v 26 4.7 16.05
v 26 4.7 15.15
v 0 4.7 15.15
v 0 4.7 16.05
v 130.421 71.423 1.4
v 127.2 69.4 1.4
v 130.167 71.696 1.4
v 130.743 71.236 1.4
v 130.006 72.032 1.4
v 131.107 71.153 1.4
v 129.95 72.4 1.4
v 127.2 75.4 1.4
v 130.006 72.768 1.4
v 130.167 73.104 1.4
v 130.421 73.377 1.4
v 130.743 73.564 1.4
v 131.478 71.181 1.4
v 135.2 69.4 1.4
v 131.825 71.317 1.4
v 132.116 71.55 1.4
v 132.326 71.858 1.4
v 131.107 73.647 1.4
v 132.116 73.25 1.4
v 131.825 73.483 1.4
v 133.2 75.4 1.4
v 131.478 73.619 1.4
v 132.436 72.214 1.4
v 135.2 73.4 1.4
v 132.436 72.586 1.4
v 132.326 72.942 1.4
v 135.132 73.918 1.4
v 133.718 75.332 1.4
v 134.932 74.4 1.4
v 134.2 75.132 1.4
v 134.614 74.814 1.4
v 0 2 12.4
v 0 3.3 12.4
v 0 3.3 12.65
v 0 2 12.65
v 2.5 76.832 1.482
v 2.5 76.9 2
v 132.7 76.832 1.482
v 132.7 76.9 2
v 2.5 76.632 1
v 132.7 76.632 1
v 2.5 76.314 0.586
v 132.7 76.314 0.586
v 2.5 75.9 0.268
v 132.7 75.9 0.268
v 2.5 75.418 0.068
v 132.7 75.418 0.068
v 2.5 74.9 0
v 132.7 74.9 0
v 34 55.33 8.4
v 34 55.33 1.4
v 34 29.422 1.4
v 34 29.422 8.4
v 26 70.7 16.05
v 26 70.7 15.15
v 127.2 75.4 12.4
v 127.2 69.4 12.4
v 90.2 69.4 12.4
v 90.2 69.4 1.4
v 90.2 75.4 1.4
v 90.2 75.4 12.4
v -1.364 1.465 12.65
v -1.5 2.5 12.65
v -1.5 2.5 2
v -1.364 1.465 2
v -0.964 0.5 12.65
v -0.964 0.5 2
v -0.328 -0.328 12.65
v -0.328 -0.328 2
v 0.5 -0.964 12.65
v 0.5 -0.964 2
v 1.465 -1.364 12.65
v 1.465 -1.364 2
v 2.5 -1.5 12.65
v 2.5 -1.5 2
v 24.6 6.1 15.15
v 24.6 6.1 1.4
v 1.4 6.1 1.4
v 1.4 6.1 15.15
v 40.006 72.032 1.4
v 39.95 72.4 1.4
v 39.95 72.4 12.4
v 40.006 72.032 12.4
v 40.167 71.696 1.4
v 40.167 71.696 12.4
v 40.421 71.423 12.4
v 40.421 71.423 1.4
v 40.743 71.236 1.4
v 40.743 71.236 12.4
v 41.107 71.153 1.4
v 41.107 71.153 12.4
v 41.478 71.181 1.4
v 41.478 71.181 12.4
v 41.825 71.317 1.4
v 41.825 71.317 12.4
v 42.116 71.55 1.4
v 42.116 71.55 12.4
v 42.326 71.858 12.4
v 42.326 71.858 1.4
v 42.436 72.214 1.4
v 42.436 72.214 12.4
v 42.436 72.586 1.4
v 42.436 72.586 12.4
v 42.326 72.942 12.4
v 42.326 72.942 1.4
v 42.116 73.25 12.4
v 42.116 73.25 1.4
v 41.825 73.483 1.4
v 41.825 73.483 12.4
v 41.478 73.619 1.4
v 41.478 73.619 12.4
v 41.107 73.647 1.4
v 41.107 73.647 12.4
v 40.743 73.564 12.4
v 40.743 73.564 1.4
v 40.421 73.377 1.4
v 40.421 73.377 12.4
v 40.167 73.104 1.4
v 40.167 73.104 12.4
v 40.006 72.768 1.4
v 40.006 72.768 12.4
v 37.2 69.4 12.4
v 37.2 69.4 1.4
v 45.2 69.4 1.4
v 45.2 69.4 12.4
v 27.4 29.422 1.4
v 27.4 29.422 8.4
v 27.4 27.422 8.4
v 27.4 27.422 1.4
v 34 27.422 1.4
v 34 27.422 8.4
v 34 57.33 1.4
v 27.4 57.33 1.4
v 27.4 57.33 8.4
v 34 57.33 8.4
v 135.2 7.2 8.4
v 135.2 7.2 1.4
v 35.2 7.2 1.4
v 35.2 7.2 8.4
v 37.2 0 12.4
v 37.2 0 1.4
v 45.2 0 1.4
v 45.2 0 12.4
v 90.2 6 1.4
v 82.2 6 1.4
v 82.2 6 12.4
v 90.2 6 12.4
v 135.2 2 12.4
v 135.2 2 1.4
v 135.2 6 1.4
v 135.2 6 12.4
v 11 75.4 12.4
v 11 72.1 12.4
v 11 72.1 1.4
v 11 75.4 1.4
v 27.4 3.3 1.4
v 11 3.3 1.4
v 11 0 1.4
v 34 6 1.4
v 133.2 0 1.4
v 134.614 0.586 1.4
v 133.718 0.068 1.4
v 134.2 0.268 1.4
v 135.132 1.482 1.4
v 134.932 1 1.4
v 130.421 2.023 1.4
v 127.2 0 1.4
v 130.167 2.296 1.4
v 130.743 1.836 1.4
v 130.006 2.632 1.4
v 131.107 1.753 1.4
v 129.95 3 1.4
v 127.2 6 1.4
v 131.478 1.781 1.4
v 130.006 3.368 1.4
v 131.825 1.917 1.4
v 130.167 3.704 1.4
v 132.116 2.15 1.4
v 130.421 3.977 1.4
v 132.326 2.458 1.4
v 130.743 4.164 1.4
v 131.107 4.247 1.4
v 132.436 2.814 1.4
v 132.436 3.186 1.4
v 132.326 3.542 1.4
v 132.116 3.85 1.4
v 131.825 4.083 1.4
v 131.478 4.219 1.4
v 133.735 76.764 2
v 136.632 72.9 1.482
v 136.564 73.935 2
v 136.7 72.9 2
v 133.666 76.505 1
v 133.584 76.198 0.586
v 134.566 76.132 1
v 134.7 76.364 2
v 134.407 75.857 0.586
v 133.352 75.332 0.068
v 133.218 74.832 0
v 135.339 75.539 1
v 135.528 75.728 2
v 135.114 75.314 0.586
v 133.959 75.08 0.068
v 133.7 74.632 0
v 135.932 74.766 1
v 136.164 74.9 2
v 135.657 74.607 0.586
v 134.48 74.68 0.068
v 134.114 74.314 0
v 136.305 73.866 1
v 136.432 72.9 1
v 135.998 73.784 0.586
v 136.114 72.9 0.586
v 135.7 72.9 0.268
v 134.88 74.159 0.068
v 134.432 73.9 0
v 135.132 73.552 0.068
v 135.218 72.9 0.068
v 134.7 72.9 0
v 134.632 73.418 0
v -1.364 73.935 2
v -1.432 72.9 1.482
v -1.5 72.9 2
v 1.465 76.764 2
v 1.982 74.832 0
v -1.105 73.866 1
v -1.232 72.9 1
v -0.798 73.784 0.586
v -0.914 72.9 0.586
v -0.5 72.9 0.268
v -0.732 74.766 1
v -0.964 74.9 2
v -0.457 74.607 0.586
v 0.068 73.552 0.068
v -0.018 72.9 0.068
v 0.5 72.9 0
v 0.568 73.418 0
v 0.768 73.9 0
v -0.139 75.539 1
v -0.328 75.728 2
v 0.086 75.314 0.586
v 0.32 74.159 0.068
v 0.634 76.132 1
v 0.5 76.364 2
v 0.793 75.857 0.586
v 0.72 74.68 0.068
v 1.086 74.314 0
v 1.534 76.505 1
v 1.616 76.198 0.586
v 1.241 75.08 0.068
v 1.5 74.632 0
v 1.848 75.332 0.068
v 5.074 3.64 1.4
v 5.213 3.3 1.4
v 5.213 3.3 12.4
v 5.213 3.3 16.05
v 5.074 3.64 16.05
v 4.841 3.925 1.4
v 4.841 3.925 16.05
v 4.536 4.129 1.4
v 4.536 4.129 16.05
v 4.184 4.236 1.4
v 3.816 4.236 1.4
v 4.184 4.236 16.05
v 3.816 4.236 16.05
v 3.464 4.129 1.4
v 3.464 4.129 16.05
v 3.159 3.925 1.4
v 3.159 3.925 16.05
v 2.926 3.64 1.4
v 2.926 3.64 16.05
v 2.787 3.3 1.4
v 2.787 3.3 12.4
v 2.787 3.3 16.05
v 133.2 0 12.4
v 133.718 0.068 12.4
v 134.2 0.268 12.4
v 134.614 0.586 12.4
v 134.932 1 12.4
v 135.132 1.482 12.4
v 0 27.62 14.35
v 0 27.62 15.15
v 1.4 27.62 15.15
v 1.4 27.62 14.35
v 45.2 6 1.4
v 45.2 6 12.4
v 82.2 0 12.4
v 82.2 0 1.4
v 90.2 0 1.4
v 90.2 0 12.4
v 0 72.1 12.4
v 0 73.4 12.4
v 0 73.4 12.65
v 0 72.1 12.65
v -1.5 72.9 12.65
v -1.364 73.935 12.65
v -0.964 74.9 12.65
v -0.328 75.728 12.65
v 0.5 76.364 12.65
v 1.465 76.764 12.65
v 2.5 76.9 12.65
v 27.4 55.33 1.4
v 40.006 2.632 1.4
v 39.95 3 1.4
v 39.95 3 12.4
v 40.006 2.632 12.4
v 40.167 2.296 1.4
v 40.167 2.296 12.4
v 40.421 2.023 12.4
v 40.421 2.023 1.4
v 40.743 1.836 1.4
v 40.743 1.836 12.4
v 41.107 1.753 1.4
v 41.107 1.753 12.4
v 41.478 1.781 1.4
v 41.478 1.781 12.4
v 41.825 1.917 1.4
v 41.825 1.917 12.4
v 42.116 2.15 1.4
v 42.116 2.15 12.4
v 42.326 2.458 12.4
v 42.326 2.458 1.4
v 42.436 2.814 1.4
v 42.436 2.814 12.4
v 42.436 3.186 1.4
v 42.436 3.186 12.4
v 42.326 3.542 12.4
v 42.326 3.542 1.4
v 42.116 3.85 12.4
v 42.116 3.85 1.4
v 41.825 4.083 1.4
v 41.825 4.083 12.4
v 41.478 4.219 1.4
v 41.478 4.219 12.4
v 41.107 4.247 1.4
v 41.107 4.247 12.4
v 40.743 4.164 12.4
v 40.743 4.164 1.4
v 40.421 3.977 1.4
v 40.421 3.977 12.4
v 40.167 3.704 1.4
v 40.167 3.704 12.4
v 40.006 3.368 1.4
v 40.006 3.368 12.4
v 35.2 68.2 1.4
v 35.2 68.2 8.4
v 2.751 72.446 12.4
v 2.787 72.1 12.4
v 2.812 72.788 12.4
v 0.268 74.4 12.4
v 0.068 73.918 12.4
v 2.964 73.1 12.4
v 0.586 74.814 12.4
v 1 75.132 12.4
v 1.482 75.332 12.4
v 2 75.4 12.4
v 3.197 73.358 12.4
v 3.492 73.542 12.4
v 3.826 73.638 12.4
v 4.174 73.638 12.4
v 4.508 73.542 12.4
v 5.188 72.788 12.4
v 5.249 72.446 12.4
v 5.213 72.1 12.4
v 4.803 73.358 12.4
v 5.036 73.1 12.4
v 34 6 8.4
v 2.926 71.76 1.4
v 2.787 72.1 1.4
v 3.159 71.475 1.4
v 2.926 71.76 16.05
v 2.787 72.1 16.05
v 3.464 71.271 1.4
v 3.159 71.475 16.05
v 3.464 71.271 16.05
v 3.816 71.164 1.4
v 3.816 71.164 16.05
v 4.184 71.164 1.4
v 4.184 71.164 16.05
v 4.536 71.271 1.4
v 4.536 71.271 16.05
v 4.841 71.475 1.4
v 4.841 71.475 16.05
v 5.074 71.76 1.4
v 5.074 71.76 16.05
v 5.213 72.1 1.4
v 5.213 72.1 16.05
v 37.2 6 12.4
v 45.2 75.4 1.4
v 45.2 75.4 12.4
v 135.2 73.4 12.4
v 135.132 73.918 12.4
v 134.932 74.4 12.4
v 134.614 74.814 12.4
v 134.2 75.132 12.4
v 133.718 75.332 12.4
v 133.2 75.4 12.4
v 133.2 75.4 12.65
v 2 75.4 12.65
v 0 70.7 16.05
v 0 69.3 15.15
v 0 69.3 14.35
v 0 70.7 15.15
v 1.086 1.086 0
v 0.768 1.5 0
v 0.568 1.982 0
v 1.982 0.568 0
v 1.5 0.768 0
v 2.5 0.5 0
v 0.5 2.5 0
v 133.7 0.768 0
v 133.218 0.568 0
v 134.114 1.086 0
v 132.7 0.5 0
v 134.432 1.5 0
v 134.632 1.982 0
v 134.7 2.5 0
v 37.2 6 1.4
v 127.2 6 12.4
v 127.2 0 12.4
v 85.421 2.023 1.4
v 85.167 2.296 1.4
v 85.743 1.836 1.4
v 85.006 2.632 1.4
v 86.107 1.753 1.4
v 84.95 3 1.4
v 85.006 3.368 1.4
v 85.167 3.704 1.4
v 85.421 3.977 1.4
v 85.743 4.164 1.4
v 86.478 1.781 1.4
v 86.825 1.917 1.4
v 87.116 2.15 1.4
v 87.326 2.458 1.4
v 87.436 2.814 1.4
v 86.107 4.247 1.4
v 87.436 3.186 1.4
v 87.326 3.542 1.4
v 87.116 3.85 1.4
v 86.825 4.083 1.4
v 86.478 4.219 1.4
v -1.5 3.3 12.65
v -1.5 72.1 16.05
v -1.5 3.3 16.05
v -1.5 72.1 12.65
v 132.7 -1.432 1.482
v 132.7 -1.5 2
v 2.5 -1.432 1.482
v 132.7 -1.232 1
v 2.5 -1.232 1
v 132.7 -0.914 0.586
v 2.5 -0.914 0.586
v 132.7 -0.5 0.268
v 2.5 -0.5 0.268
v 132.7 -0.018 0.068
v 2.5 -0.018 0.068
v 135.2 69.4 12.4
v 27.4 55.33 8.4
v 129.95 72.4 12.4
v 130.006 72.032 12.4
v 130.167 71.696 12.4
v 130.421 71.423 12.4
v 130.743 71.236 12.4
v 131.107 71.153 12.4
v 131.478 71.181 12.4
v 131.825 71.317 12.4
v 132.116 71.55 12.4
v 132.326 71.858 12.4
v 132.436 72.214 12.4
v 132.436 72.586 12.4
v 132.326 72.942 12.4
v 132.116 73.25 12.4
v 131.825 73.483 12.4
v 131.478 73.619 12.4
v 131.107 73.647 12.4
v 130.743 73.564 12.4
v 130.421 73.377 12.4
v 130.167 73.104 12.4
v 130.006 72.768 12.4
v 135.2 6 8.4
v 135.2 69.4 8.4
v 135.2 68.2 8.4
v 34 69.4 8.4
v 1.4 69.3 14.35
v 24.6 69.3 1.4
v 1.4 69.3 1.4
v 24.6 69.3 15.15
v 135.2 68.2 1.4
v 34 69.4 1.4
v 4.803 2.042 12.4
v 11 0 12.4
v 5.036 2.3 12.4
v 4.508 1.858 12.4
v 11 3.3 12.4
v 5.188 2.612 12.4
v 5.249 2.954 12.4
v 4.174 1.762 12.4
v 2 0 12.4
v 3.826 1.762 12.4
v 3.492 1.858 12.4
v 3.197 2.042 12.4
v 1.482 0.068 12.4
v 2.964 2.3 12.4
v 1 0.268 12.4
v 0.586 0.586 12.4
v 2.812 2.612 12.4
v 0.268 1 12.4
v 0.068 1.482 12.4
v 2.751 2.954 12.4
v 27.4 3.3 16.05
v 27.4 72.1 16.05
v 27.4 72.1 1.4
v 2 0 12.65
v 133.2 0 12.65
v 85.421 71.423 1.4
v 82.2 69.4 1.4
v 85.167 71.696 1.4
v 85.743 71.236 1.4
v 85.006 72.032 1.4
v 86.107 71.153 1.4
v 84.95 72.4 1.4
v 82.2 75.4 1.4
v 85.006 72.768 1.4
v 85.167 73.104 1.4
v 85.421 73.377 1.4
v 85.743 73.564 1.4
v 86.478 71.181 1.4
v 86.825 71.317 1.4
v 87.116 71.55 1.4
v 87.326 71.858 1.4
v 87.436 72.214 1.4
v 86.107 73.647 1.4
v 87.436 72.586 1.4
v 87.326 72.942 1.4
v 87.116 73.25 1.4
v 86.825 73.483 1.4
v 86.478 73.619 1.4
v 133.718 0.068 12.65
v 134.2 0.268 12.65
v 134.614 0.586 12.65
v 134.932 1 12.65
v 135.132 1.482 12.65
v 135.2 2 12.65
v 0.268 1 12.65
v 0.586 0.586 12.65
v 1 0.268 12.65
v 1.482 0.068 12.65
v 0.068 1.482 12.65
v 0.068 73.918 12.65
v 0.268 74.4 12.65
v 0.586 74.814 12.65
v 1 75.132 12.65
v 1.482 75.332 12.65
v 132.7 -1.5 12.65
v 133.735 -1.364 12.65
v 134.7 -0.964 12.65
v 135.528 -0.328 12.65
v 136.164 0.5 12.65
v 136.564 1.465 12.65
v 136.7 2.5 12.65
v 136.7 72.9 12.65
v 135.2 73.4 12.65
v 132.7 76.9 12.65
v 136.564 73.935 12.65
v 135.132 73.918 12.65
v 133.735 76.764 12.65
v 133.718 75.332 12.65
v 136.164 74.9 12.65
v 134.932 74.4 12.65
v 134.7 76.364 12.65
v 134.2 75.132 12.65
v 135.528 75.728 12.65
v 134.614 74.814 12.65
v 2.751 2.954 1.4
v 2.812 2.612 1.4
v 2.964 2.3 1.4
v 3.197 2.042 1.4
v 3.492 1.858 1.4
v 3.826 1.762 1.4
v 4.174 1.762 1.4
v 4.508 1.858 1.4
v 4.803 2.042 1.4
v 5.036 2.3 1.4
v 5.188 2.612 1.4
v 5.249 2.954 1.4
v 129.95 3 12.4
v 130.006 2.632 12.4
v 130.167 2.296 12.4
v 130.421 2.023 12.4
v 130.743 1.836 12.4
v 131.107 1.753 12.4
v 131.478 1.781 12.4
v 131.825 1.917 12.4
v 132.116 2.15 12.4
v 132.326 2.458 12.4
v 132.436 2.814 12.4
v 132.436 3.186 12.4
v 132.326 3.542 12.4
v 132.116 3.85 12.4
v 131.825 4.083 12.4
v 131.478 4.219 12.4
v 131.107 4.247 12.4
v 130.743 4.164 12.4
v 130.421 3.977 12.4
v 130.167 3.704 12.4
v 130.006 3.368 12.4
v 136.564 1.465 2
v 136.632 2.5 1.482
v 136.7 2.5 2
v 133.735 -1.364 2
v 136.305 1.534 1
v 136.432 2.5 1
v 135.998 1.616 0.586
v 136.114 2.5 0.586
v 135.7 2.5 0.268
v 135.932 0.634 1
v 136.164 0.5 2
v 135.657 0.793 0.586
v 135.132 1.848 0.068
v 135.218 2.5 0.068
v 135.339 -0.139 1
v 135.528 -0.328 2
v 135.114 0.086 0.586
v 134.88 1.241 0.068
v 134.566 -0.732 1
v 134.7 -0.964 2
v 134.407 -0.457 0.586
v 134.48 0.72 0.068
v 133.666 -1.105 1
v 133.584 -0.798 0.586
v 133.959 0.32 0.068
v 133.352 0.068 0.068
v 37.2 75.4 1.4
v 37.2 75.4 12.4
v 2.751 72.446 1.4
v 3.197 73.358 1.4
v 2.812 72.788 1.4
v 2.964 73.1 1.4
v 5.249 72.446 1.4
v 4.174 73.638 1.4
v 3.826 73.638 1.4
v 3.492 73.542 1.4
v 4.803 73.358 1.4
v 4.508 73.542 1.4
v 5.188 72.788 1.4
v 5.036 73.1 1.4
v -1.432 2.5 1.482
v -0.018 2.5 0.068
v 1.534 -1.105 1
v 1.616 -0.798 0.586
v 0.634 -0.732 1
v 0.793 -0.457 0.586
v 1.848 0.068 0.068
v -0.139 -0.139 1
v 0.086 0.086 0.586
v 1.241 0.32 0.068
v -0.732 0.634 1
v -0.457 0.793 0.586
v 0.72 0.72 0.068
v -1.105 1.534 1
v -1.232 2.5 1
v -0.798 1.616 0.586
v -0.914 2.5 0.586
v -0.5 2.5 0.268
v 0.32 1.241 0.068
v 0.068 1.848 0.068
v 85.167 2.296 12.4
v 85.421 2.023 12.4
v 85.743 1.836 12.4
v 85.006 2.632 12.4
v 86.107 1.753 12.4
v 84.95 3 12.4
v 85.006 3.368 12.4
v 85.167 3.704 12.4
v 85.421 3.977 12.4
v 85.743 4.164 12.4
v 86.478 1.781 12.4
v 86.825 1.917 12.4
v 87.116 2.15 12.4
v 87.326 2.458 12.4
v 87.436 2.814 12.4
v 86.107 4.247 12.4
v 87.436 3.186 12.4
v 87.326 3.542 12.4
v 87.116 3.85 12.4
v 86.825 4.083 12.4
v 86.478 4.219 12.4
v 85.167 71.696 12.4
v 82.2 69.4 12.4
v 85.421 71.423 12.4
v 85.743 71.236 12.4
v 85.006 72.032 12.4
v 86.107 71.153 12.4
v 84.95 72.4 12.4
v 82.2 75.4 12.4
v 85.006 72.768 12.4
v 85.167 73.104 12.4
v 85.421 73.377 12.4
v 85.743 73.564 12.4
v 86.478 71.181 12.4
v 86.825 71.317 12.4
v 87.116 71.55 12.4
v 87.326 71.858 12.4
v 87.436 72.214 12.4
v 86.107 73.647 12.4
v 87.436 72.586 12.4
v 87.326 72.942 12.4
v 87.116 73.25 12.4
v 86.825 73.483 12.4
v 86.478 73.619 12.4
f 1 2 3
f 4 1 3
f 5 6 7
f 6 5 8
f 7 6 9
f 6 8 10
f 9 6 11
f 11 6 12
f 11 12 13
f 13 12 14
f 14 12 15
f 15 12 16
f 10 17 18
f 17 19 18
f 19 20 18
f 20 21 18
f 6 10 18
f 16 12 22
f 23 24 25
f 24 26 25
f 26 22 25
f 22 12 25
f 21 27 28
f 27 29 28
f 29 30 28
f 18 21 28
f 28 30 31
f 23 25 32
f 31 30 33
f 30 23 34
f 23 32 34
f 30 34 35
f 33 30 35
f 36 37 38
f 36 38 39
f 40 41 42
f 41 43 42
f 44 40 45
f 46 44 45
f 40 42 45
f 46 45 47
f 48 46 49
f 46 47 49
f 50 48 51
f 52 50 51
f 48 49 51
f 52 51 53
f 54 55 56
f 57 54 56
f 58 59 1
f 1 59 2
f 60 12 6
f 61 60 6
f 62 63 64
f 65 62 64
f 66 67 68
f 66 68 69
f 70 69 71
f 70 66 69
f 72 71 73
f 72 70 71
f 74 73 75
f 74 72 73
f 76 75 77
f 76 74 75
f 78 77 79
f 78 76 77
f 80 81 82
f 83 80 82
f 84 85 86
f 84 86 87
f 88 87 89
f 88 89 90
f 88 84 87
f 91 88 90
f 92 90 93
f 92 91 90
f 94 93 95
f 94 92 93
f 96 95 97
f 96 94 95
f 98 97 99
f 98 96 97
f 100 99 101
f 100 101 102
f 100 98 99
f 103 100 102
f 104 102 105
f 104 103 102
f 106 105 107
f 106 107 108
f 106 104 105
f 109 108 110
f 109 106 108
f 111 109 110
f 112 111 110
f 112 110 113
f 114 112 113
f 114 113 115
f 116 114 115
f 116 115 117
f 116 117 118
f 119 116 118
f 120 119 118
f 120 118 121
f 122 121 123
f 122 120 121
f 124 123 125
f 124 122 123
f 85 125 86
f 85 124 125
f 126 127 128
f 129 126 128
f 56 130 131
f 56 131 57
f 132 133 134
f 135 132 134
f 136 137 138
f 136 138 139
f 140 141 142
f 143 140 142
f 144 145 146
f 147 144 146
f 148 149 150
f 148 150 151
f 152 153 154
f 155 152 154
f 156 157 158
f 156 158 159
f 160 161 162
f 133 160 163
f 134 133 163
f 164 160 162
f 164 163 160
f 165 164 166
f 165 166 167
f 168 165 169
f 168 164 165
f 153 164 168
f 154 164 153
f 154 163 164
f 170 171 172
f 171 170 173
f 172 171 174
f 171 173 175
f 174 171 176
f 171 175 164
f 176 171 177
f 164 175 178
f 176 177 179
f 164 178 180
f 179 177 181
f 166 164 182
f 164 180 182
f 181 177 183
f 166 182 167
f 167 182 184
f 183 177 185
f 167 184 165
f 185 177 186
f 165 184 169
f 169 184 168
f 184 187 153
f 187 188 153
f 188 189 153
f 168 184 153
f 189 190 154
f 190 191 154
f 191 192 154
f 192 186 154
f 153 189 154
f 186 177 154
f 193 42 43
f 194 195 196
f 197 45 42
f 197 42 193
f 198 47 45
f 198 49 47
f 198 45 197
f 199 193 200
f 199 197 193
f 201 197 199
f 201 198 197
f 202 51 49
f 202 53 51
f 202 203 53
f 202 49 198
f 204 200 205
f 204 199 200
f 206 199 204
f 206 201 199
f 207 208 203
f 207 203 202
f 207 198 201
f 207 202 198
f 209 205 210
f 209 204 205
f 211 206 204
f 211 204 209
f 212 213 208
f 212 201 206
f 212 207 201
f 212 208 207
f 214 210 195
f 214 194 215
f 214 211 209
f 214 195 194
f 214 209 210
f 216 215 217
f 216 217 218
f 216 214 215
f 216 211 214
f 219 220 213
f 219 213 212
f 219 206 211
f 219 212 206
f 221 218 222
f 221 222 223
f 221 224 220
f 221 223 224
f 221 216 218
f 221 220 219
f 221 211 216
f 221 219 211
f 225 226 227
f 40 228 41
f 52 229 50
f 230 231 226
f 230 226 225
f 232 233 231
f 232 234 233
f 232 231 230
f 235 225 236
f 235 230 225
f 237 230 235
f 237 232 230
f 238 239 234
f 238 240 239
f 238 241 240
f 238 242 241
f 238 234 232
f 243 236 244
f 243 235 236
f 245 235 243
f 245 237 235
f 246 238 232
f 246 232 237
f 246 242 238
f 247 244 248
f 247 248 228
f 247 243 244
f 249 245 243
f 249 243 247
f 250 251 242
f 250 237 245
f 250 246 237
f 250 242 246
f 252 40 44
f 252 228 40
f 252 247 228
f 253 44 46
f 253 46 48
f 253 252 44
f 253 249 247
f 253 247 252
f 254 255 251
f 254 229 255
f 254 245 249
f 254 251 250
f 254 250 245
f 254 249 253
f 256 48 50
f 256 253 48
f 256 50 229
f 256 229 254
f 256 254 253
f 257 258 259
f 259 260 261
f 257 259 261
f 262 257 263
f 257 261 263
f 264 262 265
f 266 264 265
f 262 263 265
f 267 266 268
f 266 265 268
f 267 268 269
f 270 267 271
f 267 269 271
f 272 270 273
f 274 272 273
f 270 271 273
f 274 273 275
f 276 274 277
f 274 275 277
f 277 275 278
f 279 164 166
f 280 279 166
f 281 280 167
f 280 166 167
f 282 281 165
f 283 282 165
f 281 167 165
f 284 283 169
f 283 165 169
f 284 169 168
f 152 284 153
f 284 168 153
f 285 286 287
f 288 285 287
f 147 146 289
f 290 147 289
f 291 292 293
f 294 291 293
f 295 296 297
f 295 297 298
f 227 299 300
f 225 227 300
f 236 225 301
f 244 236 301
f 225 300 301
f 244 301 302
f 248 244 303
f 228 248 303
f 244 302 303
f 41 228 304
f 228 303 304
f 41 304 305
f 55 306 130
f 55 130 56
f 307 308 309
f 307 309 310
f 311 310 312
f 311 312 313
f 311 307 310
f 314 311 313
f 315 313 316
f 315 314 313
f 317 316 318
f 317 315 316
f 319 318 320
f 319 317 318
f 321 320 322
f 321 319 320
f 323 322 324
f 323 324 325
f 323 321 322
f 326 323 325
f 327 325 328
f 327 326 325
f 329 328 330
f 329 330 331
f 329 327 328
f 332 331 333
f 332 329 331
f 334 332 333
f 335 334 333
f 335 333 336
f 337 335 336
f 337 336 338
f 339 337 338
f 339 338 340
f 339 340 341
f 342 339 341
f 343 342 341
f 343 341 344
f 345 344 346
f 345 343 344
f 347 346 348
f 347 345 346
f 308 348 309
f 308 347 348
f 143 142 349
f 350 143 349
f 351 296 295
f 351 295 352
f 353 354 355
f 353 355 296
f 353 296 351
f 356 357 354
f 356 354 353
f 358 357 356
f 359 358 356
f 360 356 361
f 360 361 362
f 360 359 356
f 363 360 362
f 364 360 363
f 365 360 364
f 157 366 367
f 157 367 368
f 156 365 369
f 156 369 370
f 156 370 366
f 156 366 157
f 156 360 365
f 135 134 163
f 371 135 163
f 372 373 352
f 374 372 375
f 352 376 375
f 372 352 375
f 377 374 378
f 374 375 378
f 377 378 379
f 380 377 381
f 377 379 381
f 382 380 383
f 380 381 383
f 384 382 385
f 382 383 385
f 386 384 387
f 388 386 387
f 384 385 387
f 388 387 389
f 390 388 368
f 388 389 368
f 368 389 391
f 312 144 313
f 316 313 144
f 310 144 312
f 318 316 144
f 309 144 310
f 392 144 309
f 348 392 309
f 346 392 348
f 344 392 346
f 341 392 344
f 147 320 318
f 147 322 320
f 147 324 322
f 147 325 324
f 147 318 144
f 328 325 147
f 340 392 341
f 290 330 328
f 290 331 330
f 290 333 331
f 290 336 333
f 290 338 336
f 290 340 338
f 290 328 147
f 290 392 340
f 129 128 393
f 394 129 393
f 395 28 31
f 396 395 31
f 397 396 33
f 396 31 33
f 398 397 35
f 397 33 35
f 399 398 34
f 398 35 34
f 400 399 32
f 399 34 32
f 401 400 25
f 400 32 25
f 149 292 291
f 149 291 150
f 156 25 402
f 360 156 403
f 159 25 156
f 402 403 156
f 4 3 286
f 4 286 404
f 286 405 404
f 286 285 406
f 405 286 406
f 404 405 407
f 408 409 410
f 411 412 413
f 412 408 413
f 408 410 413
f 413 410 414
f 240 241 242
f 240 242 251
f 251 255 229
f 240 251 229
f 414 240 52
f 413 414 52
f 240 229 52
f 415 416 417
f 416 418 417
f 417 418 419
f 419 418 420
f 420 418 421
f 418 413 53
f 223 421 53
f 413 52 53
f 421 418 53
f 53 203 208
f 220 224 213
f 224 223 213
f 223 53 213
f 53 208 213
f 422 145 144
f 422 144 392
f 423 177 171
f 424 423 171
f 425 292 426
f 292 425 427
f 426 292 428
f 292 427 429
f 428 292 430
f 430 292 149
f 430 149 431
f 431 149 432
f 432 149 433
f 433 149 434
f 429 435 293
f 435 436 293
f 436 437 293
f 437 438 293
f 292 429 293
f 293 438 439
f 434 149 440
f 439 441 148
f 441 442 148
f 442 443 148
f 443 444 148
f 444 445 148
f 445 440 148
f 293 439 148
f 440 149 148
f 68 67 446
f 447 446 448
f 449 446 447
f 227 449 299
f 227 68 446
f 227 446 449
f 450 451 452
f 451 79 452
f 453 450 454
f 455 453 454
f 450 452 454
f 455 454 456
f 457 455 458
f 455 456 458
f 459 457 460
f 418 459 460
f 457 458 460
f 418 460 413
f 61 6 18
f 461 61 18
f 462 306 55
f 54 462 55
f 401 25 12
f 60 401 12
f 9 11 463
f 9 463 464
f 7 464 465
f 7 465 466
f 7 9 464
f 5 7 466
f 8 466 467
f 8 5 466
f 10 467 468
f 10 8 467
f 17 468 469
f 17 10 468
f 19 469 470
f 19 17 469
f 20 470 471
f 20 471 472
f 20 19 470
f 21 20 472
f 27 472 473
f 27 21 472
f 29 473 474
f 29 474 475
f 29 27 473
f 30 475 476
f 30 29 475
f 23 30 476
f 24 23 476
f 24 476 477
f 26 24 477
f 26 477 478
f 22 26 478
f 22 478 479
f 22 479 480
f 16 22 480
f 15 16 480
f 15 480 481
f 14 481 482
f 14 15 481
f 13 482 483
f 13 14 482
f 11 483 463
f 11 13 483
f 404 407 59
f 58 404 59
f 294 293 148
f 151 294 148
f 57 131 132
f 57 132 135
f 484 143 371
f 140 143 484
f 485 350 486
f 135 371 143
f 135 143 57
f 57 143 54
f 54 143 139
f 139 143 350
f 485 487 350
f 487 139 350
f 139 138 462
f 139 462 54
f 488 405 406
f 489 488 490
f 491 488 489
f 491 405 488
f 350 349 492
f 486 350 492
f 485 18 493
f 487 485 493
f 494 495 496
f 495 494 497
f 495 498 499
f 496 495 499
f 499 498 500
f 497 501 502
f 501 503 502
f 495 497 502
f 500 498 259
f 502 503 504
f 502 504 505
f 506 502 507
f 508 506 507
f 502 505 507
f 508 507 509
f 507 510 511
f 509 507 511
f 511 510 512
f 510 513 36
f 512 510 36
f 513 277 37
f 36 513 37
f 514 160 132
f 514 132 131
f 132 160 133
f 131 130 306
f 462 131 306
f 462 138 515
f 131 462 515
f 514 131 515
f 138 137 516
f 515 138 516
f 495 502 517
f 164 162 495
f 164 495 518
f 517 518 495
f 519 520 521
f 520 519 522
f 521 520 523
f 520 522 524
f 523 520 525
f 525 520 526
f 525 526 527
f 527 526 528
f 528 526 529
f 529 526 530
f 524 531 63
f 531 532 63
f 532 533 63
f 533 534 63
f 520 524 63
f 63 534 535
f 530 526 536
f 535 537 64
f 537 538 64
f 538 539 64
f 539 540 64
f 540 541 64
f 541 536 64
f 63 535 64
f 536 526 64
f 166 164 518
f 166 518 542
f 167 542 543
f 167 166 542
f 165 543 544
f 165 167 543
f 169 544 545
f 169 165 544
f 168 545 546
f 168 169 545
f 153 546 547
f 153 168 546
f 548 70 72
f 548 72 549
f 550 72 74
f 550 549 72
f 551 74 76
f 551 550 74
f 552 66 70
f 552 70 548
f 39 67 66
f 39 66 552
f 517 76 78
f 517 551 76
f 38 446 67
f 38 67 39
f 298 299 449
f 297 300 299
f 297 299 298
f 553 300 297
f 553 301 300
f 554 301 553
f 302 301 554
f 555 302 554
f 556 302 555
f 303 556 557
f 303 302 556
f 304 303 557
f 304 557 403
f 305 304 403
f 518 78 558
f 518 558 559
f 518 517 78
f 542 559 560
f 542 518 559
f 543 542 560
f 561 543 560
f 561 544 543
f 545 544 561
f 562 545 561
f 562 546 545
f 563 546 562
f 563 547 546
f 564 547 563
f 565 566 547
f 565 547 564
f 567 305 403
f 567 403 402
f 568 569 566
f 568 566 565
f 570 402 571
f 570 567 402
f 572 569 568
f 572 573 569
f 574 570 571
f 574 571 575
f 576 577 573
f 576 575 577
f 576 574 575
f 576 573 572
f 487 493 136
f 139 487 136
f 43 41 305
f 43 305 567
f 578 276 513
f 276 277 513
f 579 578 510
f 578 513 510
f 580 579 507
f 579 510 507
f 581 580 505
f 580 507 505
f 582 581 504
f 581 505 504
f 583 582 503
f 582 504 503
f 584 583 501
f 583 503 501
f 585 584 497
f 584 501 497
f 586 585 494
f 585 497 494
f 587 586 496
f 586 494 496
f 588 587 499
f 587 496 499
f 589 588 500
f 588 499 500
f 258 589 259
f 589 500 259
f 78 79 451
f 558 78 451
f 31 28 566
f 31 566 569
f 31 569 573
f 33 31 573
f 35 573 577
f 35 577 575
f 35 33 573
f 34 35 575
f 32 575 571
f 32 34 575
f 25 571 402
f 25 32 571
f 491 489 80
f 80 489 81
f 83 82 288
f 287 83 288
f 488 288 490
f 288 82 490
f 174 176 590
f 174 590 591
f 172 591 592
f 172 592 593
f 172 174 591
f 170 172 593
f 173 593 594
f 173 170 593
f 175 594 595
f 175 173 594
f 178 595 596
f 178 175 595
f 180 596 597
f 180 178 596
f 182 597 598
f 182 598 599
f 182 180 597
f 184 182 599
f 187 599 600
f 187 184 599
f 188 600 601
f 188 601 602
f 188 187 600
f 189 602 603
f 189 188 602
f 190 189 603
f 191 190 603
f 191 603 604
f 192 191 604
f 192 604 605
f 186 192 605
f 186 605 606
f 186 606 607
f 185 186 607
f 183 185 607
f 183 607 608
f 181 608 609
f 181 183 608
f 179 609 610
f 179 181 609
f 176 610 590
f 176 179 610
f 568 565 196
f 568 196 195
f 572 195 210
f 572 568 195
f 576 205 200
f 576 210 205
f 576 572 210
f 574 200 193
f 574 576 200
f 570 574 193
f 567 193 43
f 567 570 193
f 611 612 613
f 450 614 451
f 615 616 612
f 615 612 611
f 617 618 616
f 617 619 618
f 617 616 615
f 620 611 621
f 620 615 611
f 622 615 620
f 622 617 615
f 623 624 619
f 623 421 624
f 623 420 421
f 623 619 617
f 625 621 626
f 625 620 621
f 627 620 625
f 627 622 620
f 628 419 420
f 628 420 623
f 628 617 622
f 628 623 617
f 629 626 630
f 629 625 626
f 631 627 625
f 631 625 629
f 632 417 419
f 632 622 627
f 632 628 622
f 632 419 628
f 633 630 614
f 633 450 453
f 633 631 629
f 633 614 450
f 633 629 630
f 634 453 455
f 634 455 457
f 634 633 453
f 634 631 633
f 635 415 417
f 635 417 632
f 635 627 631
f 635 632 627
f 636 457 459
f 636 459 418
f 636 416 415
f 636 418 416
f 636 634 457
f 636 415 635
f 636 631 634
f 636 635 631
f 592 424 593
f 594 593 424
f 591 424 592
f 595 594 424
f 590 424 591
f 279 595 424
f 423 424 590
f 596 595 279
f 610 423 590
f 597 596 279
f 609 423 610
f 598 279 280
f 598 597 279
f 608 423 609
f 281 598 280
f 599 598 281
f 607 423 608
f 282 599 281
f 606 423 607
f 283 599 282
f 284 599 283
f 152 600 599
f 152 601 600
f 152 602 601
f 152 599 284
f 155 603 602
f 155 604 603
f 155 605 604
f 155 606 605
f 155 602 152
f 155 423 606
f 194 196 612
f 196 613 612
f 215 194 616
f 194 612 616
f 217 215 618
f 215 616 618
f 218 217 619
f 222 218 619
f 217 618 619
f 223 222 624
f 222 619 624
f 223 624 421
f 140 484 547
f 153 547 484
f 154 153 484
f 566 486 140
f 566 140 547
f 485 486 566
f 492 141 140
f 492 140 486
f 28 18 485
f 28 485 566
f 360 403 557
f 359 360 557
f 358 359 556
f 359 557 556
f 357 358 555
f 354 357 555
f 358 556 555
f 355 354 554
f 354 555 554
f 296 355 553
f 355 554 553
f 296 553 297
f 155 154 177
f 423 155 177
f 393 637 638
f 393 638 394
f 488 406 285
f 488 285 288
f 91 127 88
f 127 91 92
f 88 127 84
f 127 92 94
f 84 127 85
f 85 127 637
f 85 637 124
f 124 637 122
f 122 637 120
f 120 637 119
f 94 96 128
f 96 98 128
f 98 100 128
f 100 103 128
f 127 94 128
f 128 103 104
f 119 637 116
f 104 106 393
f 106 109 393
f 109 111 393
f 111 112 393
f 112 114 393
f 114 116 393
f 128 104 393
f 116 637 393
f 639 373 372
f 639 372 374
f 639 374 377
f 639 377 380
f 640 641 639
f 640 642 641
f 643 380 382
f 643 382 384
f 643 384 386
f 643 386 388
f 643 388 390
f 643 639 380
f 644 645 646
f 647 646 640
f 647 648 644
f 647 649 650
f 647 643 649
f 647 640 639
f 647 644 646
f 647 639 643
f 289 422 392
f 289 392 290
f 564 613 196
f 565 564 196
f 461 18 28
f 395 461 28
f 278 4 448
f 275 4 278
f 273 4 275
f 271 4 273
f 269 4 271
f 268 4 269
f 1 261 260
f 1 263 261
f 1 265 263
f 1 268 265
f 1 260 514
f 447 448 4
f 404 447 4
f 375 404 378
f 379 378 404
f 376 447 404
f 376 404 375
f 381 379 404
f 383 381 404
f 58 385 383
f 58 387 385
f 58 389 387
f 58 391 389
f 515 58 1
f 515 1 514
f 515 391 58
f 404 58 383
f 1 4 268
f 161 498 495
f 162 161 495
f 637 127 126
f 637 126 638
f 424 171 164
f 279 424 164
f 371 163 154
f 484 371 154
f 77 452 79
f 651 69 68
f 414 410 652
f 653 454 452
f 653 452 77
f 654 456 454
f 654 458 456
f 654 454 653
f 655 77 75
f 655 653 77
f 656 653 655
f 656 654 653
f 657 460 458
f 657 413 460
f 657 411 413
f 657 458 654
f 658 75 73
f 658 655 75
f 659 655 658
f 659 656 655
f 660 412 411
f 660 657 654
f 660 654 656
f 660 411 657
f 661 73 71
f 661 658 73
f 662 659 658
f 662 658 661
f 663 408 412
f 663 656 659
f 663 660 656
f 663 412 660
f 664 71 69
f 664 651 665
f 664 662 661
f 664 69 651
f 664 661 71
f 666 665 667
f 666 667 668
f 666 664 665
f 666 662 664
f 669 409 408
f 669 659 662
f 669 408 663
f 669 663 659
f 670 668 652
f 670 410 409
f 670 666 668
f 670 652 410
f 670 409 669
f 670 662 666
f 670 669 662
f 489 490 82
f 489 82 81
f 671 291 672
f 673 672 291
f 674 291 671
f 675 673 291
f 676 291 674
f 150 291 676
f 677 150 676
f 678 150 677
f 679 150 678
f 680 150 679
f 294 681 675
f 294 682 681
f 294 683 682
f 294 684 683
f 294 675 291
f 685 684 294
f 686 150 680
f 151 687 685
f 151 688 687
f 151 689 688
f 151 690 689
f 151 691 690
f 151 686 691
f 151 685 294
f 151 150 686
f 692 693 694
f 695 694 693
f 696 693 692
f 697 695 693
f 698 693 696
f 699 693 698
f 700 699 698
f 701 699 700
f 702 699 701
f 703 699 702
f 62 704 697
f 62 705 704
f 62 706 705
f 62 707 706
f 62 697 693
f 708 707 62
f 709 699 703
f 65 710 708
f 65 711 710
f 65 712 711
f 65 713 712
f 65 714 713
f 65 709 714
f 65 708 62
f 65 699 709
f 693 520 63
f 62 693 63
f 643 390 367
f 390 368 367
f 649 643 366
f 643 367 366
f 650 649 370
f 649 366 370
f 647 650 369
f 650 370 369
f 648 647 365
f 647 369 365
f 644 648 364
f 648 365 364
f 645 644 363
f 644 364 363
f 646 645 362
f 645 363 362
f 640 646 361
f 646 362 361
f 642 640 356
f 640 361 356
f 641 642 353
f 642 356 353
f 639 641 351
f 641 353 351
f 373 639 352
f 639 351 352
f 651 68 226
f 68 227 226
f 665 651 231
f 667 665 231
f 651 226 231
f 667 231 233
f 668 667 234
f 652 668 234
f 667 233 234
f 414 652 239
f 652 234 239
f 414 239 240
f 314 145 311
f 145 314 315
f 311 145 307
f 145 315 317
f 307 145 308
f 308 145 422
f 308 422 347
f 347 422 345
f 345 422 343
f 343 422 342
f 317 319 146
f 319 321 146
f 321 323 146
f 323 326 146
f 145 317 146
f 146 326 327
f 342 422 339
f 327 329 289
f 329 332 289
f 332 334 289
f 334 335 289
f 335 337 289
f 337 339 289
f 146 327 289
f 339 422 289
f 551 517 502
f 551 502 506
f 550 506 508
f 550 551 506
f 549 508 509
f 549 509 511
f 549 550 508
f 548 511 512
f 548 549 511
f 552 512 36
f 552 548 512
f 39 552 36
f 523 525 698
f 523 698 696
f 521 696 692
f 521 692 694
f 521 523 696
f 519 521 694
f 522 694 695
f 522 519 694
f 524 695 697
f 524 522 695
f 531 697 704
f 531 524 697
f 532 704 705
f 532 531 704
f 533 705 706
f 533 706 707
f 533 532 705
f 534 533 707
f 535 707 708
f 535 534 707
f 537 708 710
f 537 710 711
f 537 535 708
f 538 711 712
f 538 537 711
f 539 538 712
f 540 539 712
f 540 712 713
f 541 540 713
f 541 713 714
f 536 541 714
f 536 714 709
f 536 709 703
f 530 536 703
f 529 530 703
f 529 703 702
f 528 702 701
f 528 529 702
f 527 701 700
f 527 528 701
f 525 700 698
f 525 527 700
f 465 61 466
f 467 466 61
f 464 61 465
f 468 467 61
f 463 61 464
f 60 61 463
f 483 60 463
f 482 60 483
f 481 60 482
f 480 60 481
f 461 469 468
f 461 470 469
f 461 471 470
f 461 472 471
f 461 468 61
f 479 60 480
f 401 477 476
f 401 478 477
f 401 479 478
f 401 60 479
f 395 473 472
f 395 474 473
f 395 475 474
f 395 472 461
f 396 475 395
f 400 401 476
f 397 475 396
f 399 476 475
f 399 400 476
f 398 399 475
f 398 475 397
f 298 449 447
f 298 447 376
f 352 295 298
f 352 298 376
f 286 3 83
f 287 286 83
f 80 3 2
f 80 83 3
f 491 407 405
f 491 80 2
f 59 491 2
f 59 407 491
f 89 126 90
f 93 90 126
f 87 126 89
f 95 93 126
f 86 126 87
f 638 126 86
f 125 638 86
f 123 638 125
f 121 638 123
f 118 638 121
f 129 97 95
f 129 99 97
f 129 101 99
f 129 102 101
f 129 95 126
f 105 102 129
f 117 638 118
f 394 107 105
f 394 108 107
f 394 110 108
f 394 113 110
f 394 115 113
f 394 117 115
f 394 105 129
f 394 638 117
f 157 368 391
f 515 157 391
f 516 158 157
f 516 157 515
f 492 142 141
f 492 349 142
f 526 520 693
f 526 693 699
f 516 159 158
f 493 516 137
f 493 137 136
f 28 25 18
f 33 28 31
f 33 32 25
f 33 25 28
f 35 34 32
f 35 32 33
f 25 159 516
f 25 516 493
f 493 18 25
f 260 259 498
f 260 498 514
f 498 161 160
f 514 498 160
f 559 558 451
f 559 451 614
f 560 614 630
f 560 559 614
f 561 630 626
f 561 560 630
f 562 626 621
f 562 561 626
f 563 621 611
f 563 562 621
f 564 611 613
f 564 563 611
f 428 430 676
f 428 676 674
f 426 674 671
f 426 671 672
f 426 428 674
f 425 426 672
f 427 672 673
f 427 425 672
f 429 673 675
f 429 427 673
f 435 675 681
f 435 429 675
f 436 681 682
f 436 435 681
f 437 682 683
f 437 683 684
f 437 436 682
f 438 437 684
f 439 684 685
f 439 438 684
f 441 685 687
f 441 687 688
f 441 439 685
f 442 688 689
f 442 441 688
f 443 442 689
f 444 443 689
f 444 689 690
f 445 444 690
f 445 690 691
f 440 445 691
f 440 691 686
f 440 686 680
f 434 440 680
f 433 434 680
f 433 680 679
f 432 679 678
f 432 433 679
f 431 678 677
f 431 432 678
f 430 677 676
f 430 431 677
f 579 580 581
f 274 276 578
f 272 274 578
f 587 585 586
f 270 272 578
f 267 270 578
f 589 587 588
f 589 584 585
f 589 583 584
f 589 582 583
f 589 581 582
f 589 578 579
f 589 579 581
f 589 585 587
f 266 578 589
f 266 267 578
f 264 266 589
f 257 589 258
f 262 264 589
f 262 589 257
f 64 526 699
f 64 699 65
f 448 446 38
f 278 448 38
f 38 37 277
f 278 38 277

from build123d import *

# Parameters (mm, degrees)
ESQUISSE1_W             = 138.2
ESQUISSE1_H             = 78.4
BOSS_EXTRU_1_DEPTH      = 12.65
BOSS_EXTRU_2_DEPTH      = 1.4
BOSS_EXTRU_5_START      = 1.4
ESQUISSE1_5_R           = 1.25
BOSS_EXTRU_5_DEPTH      = 11
ESQUISSE1_5_W           = 8
ESQUISSE1_5_H           = 6
BOSS_EXTRU_5_2_DEPTH    = 11
BOSS_EXTRU_5_3_DEPTH    = 11
BOSS_EXTRU_5_4_DEPTH    = 11
BOSS_EXTRU_5_5_DEPTH    = 11
BOSS_EXTRU_5_6_DEPTH    = 11
BOSS_EXTRU_7_START      = 1.4
BOSS_EXTRU_7_DEPTH      = 7
CONG_1_R                = 4
CONG_4_R                = 2
BOSS_EXTRU_8_START      = 1.4
BOSS_EXTRU_8_DEPTH      = 13.75
BOSS_EXTRU_9_START      = 1.4
BOSS_EXTRU_9_DEPTH      = 14.65
BOSS_EXTRU_11_START     = 11
ESQUISSE4_R             = 1.25
BOSS_EXTRU_11_DEPTH     = 11
ESQUISSE5_W             = 6.6
ESQUISSE5_H             = 2
BOSS_EXTRU_12_DEPTH     = 7
CONG_3_R                = 2
ESQUISSE7_W             = 1.4
ESQUISSE7_H             = 41.680372202
ENL_V_MAT_EXTRU_3_DEPTH = 0.8
ESQUISSE2_W             = 1.5
ESQUISSE2_H             = 68.8
BOSS_EXTRU_14_DEPTH     = 3.4
ENL_V_START             = 30.15
ENL_V_MAT_EXTRU_4_DEPTH = 30.15


with BuildPart() as part:
    # Esquisse1 → Boss.-Extru.1 (new body)
    with BuildSketch(Plane.XY):
        with Locations((67.6, 37.7)):
            Rectangle(ESQUISSE1_W, ESQUISSE1_H)
        with BuildLine():
            Line((0, 0), (133.2, 0))
            ThreePointArc((133.2, 0), (134.614213562, 0.585786438), (135.2, 2))
            Line((135.2, 2), (135.2, 73.4))
            ThreePointArc((135.2, 73.4), (134.614213562, 74.814213562), (133.2, 75.4))
            Line((133.2, 75.4), (0, 75.4))
            Line((0, 75.4), (0, 0))
        make_face(mode=Mode.SUBTRACT)
    extrude(amount=BOSS_EXTRU_1_DEPTH)

    # Esquisse1<4> → Boss.-Extru.2 (add)
    with BuildSketch(Plane.XY):
        with BuildLine():
            Line((0, 0), (133.2, 0))
            ThreePointArc((133.2, 0), (134.614213562, 0.585786438), (135.2, 2))
            Line((135.2, 2), (135.2, 73.4))
            ThreePointArc((135.2, 73.4), (134.614213562, 74.814213562), (133.2, 75.4))
            Line((133.2, 75.4), (0, 75.4))
            Line((0, 75.4), (0, 0))
        make_face()
    extrude(amount=BOSS_EXTRU_2_DEPTH)

    # Esquisse1<6> → Boss.-Extru.7 (add)
    with BuildSketch(Plane.XY.offset(BOSS_EXTRU_7_START)):
        Polygon((135.2, 68.2), (135.2, 69.4), (127.2, 69.4), (90.2, 69.4), (82.2, 69.4), (45.2, 69.4), (37.2, 69.4), (34, 69.4), (34, 37.7), (35.2, 37.7), (35.2, 68.2), align=None)
        Polygon((135.2, 6), (135.2, 7.2), (35.2, 7.2), (35.2, 37.7), (34, 37.7), (34, 6), (37.2, 6), (45.2, 6), (82.2, 6), (90.2, 6), (127.2, 6), align=None)
    extrude(amount=BOSS_EXTRU_7_DEPTH)

    # Congé1
    cong_1_edges = [part.edges().sort_by_distance(p)[0] for p in [
        (-1.5, 76.9, 6.325),
        (136.7, 76.9, 6.325),
        (136.7, -1.5, 6.325),
        (-1.5, -1.5, 6.325),
    ]]
    fillet(cong_1_edges, radius=CONG_1_R)

    # Congé4
    cong_4_edges = [part.edges().sort_by_distance(p)[0] for p in [
        (0, 75.4, 7.025),
        (0, 0, 7.025),
    ]]
    fillet(cong_4_edges, radius=CONG_4_R)

    # Esquisse1<7> → Boss.-Extru.8 (add)
    with BuildSketch(Plane.XY.offset(BOSS_EXTRU_8_START)):
        Polygon((24.6, 37.7), (26, 37.7), (26, 70.7), (0, 70.7), (0, 37.7), (1.4, 37.7), (1.4, 69.3), (24.6, 69.3), align=None)
        Polygon((26, 4.7), (26, 37.7), (24.6, 37.7), (24.6, 6.1), (1.4, 6.1), (1.4, 37.7), (0, 37.7), (0, 4.7), align=None)
    extrude(amount=BOSS_EXTRU_8_DEPTH)

    # Esquisse1<8> → Boss.-Extru.9 (add)
    with BuildSketch(Plane.XY.offset(BOSS_EXTRU_9_START)):
        Polygon((27.4, 3.3), (27.4, 72.1), (0, 72.1), (0, 70.7), (26, 70.7), (26, 4.7), (0, 4.7), (0, 3.3), align=None)
    extrude(amount=BOSS_EXTRU_9_DEPTH)

    # Esquisse4 → Boss.-Extru.11 (add)
    # profile 1 of 2: a face of its own
    with BuildSketch(Plane.XY.offset(1.4).offset(BOSS_EXTRU_11_START)):
        with BuildLine():
            Line((11, 75.4), (2, 75.4))
            ThreePointArc((2, 75.4), (0.585786438, 74.814213562), (0, 73.4))
            Line((0, 73.4), (0, 70.737356087))
            Line((0, 70.737356087), (11, 70.737356087))
            Line((11, 70.737356087), (11, 75.4))
        make_face()
        with Locations((4, 72.4)):
            Circle(ESQUISSE4_R, mode=Mode.SUBTRACT)
    # profile 2 of 2: a face of its own
    with BuildSketch(Plane.XY.offset(1.4).offset(BOSS_EXTRU_11_START)):
        with BuildLine():
            Line((0, 4.608067271), (11, 4.608067271))
            Line((11, 4.608067271), (11, 0))
            Line((11, 0), (2, 0))
            ThreePointArc((2, 0), (0.585786438, 0.585786438), (0, 2))
            Line((0, 2), (0, 4.608067271))
        make_face()
        with Locations((4, 3)):
            Circle(ESQUISSE4_R, mode=Mode.SUBTRACT)
    extrude(amount=-BOSS_EXTRU_11_DEPTH)

    # Esquisse5 → Boss.-Extru.12 (add)
    with BuildSketch(Plane.XY.offset(1.4)):
        with Locations((30.7, 56.329620473)):
            Rectangle(ESQUISSE5_W, ESQUISSE5_H)
        with Locations((30.7, 28.421993419)):
            Rectangle(ESQUISSE5_W, ESQUISSE5_H)
    extrude(amount=BOSS_EXTRU_12_DEPTH)

    # Congé3
    cong_3_edges = [part.edges().sort_by_distance(p)[0] for p in [
        (-1.5, 37.7, 0),
        (67.6, 76.9, 0),
        (136.7, 37.7, 0),
        (67.6, -1.5, 0),
        (135.528427125, 75.728427125, 0),
        (135.528427125, -0.328427125, 0),
        (-0.328427125, -0.328427125, 0),
        (-0.328427125, 75.728427125, 0),
    ]]
    fillet(cong_3_edges, radius=CONG_3_R)

    # Esquisse7 → Enlèv. mat.-Extru.3 (cut)
    with BuildSketch(Plane.XY.offset(15.15)):
        with Locations((0.7, 48.459813899)):
            Rectangle(ESQUISSE7_W, ESQUISSE7_H)
    extrude(amount=-ENL_V_MAT_EXTRU_3_DEPTH, mode=Mode.SUBTRACT)

    # Esquisse2 → Boss.-Extru.14 (add)
    with BuildSketch(Plane.XY.offset(12.65)):
        with Locations((-0.75, 37.7)):
            Rectangle(ESQUISSE2_W, ESQUISSE2_H)
    extrude(amount=BOSS_EXTRU_14_DEPTH)

    # Esquisse4<2> → Enlèv. mat.-Extru.4 (cut)
    with BuildSketch(Plane.XY.offset(1.4).offset(ENL_V_START)):
        with BuildLine():
            Line((2.78653389, 72.1), (5.21346611, 72.1))
            ThreePointArc((5.21346611, 72.1), (5.240832913, 72.248891823), (5.25, 72.4))
            ThreePointArc((5.25, 72.4), (3.848891823, 73.640832913), (2.78653389, 72.1))
        make_face()
        with BuildLine():
            ThreePointArc((2.78653389, 72.1), (4, 71.15), (5.21346611, 72.1))
            Line((5.21346611, 72.1), (2.78653389, 72.1))
        make_face()
        with BuildLine():
            Line((5.21346611, 3.3), (2.78653389, 3.3))
            ThreePointArc((2.78653389, 3.3), (3.848891823, 1.759167087), (5.25, 3))
            ThreePointArc((5.25, 3), (5.240832913, 3.151108177), (5.21346611, 3.3))
        make_face()
        with BuildLine():
            ThreePointArc((5.21346611, 3.3), (4, 4.25), (2.78653389, 3.3))
            Line((2.78653389, 3.3), (5.21346611, 3.3))
        make_face()
    extrude(amount=-ENL_V_MAT_EXTRU_4_DEPTH, mode=Mode.SUBTRACT)


with BuildPart() as body_2:
    # Esquisse1<5> → Boss.-Extru.5 (new body)
    with BuildSketch(Plane.XY.offset(BOSS_EXTRU_5_START)):
        with BuildLine():
            Line((127.2, 69.4), (135.2, 69.4))
            Line((135.2, 69.4), (135.2, 73.4))
            ThreePointArc((135.2, 73.4), (134.614213562, 74.814213562), (133.2, 75.4))
            Line((133.2, 75.4), (127.2, 75.4))
            Line((127.2, 75.4), (127.2, 69.4))
        make_face()
        with Locations(Location((131.2, 72.4, 0), (0, 0, 180))):
            Circle(ESQUISSE1_5_R, mode=Mode.SUBTRACT)
    extrude(amount=BOSS_EXTRU_5_DEPTH)


with BuildPart() as body_3:
    # Esquisse1<5> → Boss.-Extru.5 2 (new body)
    with BuildSketch(Plane.XY.offset(BOSS_EXTRU_5_START)):
        with Locations((86.2, 72.4)):
            Rectangle(ESQUISSE1_5_W, ESQUISSE1_5_H)
        with Locations(Location((86.2, 72.4, 0), (0, 0, 180))):
            Circle(ESQUISSE1_5_R, mode=Mode.SUBTRACT)
    extrude(amount=BOSS_EXTRU_5_2_DEPTH)


with BuildPart() as body_4:
    # Esquisse1<5> → Boss.-Extru.5 3 (new body)
    with BuildSketch(Plane.XY.offset(BOSS_EXTRU_5_START)):
        with BuildLine():
            Line((135.2, 2), (135.2, 6))
            Line((135.2, 6), (127.2, 6))
            Line((127.2, 6), (127.2, 0))
            Line((127.2, 0), (133.2, 0))
            ThreePointArc((133.2, 0), (134.614213562, 0.585786438), (135.2, 2))
        make_face()
        with Locations(Location((131.2, 3, 0), (0, 0, 180))):
            Circle(ESQUISSE1_5_R, mode=Mode.SUBTRACT)
    extrude(amount=BOSS_EXTRU_5_3_DEPTH)


with BuildPart() as body_5:
    # Esquisse1<5> → Boss.-Extru.5 4 (new body)
    with BuildSketch(Plane.XY.offset(BOSS_EXTRU_5_START)):
        with Locations((41.2, 72.4)):
            Rectangle(ESQUISSE1_5_W, ESQUISSE1_5_H)
        with Locations(Location((41.2, 72.4, 0), (0, 0, 180))):
            Circle(ESQUISSE1_5_R, mode=Mode.SUBTRACT)
    extrude(amount=BOSS_EXTRU_5_4_DEPTH)


with BuildPart() as body_6:
    # Esquisse1<5> → Boss.-Extru.5 5 (new body)
    with BuildSketch(Plane.XY.offset(BOSS_EXTRU_5_START)):
        with Locations((86.2, 3)):
            Rectangle(ESQUISSE1_5_W, ESQUISSE1_5_H)
        with Locations(Location((86.2, 3, 0), (0, 0, 180))):
            Circle(ESQUISSE1_5_R, mode=Mode.SUBTRACT)
    extrude(amount=BOSS_EXTRU_5_5_DEPTH)


with BuildPart() as body_7:
    # Esquisse1<5> → Boss.-Extru.5 6 (new body)
    with BuildSketch(Plane.XY.offset(BOSS_EXTRU_5_START)):
        with Locations((41.2, 3)):
            Rectangle(ESQUISSE1_5_W, ESQUISSE1_5_H)
        with Locations(Location((41.2, 3, 0), (0, 0, 180))):
            Circle(ESQUISSE1_5_R, mode=Mode.SUBTRACT)
    extrude(amount=BOSS_EXTRU_5_6_DEPTH)


solid = Compound([part.part, body_2.part, body_3.part, body_4.part, body_5.part, body_6.part, body_7.part])
